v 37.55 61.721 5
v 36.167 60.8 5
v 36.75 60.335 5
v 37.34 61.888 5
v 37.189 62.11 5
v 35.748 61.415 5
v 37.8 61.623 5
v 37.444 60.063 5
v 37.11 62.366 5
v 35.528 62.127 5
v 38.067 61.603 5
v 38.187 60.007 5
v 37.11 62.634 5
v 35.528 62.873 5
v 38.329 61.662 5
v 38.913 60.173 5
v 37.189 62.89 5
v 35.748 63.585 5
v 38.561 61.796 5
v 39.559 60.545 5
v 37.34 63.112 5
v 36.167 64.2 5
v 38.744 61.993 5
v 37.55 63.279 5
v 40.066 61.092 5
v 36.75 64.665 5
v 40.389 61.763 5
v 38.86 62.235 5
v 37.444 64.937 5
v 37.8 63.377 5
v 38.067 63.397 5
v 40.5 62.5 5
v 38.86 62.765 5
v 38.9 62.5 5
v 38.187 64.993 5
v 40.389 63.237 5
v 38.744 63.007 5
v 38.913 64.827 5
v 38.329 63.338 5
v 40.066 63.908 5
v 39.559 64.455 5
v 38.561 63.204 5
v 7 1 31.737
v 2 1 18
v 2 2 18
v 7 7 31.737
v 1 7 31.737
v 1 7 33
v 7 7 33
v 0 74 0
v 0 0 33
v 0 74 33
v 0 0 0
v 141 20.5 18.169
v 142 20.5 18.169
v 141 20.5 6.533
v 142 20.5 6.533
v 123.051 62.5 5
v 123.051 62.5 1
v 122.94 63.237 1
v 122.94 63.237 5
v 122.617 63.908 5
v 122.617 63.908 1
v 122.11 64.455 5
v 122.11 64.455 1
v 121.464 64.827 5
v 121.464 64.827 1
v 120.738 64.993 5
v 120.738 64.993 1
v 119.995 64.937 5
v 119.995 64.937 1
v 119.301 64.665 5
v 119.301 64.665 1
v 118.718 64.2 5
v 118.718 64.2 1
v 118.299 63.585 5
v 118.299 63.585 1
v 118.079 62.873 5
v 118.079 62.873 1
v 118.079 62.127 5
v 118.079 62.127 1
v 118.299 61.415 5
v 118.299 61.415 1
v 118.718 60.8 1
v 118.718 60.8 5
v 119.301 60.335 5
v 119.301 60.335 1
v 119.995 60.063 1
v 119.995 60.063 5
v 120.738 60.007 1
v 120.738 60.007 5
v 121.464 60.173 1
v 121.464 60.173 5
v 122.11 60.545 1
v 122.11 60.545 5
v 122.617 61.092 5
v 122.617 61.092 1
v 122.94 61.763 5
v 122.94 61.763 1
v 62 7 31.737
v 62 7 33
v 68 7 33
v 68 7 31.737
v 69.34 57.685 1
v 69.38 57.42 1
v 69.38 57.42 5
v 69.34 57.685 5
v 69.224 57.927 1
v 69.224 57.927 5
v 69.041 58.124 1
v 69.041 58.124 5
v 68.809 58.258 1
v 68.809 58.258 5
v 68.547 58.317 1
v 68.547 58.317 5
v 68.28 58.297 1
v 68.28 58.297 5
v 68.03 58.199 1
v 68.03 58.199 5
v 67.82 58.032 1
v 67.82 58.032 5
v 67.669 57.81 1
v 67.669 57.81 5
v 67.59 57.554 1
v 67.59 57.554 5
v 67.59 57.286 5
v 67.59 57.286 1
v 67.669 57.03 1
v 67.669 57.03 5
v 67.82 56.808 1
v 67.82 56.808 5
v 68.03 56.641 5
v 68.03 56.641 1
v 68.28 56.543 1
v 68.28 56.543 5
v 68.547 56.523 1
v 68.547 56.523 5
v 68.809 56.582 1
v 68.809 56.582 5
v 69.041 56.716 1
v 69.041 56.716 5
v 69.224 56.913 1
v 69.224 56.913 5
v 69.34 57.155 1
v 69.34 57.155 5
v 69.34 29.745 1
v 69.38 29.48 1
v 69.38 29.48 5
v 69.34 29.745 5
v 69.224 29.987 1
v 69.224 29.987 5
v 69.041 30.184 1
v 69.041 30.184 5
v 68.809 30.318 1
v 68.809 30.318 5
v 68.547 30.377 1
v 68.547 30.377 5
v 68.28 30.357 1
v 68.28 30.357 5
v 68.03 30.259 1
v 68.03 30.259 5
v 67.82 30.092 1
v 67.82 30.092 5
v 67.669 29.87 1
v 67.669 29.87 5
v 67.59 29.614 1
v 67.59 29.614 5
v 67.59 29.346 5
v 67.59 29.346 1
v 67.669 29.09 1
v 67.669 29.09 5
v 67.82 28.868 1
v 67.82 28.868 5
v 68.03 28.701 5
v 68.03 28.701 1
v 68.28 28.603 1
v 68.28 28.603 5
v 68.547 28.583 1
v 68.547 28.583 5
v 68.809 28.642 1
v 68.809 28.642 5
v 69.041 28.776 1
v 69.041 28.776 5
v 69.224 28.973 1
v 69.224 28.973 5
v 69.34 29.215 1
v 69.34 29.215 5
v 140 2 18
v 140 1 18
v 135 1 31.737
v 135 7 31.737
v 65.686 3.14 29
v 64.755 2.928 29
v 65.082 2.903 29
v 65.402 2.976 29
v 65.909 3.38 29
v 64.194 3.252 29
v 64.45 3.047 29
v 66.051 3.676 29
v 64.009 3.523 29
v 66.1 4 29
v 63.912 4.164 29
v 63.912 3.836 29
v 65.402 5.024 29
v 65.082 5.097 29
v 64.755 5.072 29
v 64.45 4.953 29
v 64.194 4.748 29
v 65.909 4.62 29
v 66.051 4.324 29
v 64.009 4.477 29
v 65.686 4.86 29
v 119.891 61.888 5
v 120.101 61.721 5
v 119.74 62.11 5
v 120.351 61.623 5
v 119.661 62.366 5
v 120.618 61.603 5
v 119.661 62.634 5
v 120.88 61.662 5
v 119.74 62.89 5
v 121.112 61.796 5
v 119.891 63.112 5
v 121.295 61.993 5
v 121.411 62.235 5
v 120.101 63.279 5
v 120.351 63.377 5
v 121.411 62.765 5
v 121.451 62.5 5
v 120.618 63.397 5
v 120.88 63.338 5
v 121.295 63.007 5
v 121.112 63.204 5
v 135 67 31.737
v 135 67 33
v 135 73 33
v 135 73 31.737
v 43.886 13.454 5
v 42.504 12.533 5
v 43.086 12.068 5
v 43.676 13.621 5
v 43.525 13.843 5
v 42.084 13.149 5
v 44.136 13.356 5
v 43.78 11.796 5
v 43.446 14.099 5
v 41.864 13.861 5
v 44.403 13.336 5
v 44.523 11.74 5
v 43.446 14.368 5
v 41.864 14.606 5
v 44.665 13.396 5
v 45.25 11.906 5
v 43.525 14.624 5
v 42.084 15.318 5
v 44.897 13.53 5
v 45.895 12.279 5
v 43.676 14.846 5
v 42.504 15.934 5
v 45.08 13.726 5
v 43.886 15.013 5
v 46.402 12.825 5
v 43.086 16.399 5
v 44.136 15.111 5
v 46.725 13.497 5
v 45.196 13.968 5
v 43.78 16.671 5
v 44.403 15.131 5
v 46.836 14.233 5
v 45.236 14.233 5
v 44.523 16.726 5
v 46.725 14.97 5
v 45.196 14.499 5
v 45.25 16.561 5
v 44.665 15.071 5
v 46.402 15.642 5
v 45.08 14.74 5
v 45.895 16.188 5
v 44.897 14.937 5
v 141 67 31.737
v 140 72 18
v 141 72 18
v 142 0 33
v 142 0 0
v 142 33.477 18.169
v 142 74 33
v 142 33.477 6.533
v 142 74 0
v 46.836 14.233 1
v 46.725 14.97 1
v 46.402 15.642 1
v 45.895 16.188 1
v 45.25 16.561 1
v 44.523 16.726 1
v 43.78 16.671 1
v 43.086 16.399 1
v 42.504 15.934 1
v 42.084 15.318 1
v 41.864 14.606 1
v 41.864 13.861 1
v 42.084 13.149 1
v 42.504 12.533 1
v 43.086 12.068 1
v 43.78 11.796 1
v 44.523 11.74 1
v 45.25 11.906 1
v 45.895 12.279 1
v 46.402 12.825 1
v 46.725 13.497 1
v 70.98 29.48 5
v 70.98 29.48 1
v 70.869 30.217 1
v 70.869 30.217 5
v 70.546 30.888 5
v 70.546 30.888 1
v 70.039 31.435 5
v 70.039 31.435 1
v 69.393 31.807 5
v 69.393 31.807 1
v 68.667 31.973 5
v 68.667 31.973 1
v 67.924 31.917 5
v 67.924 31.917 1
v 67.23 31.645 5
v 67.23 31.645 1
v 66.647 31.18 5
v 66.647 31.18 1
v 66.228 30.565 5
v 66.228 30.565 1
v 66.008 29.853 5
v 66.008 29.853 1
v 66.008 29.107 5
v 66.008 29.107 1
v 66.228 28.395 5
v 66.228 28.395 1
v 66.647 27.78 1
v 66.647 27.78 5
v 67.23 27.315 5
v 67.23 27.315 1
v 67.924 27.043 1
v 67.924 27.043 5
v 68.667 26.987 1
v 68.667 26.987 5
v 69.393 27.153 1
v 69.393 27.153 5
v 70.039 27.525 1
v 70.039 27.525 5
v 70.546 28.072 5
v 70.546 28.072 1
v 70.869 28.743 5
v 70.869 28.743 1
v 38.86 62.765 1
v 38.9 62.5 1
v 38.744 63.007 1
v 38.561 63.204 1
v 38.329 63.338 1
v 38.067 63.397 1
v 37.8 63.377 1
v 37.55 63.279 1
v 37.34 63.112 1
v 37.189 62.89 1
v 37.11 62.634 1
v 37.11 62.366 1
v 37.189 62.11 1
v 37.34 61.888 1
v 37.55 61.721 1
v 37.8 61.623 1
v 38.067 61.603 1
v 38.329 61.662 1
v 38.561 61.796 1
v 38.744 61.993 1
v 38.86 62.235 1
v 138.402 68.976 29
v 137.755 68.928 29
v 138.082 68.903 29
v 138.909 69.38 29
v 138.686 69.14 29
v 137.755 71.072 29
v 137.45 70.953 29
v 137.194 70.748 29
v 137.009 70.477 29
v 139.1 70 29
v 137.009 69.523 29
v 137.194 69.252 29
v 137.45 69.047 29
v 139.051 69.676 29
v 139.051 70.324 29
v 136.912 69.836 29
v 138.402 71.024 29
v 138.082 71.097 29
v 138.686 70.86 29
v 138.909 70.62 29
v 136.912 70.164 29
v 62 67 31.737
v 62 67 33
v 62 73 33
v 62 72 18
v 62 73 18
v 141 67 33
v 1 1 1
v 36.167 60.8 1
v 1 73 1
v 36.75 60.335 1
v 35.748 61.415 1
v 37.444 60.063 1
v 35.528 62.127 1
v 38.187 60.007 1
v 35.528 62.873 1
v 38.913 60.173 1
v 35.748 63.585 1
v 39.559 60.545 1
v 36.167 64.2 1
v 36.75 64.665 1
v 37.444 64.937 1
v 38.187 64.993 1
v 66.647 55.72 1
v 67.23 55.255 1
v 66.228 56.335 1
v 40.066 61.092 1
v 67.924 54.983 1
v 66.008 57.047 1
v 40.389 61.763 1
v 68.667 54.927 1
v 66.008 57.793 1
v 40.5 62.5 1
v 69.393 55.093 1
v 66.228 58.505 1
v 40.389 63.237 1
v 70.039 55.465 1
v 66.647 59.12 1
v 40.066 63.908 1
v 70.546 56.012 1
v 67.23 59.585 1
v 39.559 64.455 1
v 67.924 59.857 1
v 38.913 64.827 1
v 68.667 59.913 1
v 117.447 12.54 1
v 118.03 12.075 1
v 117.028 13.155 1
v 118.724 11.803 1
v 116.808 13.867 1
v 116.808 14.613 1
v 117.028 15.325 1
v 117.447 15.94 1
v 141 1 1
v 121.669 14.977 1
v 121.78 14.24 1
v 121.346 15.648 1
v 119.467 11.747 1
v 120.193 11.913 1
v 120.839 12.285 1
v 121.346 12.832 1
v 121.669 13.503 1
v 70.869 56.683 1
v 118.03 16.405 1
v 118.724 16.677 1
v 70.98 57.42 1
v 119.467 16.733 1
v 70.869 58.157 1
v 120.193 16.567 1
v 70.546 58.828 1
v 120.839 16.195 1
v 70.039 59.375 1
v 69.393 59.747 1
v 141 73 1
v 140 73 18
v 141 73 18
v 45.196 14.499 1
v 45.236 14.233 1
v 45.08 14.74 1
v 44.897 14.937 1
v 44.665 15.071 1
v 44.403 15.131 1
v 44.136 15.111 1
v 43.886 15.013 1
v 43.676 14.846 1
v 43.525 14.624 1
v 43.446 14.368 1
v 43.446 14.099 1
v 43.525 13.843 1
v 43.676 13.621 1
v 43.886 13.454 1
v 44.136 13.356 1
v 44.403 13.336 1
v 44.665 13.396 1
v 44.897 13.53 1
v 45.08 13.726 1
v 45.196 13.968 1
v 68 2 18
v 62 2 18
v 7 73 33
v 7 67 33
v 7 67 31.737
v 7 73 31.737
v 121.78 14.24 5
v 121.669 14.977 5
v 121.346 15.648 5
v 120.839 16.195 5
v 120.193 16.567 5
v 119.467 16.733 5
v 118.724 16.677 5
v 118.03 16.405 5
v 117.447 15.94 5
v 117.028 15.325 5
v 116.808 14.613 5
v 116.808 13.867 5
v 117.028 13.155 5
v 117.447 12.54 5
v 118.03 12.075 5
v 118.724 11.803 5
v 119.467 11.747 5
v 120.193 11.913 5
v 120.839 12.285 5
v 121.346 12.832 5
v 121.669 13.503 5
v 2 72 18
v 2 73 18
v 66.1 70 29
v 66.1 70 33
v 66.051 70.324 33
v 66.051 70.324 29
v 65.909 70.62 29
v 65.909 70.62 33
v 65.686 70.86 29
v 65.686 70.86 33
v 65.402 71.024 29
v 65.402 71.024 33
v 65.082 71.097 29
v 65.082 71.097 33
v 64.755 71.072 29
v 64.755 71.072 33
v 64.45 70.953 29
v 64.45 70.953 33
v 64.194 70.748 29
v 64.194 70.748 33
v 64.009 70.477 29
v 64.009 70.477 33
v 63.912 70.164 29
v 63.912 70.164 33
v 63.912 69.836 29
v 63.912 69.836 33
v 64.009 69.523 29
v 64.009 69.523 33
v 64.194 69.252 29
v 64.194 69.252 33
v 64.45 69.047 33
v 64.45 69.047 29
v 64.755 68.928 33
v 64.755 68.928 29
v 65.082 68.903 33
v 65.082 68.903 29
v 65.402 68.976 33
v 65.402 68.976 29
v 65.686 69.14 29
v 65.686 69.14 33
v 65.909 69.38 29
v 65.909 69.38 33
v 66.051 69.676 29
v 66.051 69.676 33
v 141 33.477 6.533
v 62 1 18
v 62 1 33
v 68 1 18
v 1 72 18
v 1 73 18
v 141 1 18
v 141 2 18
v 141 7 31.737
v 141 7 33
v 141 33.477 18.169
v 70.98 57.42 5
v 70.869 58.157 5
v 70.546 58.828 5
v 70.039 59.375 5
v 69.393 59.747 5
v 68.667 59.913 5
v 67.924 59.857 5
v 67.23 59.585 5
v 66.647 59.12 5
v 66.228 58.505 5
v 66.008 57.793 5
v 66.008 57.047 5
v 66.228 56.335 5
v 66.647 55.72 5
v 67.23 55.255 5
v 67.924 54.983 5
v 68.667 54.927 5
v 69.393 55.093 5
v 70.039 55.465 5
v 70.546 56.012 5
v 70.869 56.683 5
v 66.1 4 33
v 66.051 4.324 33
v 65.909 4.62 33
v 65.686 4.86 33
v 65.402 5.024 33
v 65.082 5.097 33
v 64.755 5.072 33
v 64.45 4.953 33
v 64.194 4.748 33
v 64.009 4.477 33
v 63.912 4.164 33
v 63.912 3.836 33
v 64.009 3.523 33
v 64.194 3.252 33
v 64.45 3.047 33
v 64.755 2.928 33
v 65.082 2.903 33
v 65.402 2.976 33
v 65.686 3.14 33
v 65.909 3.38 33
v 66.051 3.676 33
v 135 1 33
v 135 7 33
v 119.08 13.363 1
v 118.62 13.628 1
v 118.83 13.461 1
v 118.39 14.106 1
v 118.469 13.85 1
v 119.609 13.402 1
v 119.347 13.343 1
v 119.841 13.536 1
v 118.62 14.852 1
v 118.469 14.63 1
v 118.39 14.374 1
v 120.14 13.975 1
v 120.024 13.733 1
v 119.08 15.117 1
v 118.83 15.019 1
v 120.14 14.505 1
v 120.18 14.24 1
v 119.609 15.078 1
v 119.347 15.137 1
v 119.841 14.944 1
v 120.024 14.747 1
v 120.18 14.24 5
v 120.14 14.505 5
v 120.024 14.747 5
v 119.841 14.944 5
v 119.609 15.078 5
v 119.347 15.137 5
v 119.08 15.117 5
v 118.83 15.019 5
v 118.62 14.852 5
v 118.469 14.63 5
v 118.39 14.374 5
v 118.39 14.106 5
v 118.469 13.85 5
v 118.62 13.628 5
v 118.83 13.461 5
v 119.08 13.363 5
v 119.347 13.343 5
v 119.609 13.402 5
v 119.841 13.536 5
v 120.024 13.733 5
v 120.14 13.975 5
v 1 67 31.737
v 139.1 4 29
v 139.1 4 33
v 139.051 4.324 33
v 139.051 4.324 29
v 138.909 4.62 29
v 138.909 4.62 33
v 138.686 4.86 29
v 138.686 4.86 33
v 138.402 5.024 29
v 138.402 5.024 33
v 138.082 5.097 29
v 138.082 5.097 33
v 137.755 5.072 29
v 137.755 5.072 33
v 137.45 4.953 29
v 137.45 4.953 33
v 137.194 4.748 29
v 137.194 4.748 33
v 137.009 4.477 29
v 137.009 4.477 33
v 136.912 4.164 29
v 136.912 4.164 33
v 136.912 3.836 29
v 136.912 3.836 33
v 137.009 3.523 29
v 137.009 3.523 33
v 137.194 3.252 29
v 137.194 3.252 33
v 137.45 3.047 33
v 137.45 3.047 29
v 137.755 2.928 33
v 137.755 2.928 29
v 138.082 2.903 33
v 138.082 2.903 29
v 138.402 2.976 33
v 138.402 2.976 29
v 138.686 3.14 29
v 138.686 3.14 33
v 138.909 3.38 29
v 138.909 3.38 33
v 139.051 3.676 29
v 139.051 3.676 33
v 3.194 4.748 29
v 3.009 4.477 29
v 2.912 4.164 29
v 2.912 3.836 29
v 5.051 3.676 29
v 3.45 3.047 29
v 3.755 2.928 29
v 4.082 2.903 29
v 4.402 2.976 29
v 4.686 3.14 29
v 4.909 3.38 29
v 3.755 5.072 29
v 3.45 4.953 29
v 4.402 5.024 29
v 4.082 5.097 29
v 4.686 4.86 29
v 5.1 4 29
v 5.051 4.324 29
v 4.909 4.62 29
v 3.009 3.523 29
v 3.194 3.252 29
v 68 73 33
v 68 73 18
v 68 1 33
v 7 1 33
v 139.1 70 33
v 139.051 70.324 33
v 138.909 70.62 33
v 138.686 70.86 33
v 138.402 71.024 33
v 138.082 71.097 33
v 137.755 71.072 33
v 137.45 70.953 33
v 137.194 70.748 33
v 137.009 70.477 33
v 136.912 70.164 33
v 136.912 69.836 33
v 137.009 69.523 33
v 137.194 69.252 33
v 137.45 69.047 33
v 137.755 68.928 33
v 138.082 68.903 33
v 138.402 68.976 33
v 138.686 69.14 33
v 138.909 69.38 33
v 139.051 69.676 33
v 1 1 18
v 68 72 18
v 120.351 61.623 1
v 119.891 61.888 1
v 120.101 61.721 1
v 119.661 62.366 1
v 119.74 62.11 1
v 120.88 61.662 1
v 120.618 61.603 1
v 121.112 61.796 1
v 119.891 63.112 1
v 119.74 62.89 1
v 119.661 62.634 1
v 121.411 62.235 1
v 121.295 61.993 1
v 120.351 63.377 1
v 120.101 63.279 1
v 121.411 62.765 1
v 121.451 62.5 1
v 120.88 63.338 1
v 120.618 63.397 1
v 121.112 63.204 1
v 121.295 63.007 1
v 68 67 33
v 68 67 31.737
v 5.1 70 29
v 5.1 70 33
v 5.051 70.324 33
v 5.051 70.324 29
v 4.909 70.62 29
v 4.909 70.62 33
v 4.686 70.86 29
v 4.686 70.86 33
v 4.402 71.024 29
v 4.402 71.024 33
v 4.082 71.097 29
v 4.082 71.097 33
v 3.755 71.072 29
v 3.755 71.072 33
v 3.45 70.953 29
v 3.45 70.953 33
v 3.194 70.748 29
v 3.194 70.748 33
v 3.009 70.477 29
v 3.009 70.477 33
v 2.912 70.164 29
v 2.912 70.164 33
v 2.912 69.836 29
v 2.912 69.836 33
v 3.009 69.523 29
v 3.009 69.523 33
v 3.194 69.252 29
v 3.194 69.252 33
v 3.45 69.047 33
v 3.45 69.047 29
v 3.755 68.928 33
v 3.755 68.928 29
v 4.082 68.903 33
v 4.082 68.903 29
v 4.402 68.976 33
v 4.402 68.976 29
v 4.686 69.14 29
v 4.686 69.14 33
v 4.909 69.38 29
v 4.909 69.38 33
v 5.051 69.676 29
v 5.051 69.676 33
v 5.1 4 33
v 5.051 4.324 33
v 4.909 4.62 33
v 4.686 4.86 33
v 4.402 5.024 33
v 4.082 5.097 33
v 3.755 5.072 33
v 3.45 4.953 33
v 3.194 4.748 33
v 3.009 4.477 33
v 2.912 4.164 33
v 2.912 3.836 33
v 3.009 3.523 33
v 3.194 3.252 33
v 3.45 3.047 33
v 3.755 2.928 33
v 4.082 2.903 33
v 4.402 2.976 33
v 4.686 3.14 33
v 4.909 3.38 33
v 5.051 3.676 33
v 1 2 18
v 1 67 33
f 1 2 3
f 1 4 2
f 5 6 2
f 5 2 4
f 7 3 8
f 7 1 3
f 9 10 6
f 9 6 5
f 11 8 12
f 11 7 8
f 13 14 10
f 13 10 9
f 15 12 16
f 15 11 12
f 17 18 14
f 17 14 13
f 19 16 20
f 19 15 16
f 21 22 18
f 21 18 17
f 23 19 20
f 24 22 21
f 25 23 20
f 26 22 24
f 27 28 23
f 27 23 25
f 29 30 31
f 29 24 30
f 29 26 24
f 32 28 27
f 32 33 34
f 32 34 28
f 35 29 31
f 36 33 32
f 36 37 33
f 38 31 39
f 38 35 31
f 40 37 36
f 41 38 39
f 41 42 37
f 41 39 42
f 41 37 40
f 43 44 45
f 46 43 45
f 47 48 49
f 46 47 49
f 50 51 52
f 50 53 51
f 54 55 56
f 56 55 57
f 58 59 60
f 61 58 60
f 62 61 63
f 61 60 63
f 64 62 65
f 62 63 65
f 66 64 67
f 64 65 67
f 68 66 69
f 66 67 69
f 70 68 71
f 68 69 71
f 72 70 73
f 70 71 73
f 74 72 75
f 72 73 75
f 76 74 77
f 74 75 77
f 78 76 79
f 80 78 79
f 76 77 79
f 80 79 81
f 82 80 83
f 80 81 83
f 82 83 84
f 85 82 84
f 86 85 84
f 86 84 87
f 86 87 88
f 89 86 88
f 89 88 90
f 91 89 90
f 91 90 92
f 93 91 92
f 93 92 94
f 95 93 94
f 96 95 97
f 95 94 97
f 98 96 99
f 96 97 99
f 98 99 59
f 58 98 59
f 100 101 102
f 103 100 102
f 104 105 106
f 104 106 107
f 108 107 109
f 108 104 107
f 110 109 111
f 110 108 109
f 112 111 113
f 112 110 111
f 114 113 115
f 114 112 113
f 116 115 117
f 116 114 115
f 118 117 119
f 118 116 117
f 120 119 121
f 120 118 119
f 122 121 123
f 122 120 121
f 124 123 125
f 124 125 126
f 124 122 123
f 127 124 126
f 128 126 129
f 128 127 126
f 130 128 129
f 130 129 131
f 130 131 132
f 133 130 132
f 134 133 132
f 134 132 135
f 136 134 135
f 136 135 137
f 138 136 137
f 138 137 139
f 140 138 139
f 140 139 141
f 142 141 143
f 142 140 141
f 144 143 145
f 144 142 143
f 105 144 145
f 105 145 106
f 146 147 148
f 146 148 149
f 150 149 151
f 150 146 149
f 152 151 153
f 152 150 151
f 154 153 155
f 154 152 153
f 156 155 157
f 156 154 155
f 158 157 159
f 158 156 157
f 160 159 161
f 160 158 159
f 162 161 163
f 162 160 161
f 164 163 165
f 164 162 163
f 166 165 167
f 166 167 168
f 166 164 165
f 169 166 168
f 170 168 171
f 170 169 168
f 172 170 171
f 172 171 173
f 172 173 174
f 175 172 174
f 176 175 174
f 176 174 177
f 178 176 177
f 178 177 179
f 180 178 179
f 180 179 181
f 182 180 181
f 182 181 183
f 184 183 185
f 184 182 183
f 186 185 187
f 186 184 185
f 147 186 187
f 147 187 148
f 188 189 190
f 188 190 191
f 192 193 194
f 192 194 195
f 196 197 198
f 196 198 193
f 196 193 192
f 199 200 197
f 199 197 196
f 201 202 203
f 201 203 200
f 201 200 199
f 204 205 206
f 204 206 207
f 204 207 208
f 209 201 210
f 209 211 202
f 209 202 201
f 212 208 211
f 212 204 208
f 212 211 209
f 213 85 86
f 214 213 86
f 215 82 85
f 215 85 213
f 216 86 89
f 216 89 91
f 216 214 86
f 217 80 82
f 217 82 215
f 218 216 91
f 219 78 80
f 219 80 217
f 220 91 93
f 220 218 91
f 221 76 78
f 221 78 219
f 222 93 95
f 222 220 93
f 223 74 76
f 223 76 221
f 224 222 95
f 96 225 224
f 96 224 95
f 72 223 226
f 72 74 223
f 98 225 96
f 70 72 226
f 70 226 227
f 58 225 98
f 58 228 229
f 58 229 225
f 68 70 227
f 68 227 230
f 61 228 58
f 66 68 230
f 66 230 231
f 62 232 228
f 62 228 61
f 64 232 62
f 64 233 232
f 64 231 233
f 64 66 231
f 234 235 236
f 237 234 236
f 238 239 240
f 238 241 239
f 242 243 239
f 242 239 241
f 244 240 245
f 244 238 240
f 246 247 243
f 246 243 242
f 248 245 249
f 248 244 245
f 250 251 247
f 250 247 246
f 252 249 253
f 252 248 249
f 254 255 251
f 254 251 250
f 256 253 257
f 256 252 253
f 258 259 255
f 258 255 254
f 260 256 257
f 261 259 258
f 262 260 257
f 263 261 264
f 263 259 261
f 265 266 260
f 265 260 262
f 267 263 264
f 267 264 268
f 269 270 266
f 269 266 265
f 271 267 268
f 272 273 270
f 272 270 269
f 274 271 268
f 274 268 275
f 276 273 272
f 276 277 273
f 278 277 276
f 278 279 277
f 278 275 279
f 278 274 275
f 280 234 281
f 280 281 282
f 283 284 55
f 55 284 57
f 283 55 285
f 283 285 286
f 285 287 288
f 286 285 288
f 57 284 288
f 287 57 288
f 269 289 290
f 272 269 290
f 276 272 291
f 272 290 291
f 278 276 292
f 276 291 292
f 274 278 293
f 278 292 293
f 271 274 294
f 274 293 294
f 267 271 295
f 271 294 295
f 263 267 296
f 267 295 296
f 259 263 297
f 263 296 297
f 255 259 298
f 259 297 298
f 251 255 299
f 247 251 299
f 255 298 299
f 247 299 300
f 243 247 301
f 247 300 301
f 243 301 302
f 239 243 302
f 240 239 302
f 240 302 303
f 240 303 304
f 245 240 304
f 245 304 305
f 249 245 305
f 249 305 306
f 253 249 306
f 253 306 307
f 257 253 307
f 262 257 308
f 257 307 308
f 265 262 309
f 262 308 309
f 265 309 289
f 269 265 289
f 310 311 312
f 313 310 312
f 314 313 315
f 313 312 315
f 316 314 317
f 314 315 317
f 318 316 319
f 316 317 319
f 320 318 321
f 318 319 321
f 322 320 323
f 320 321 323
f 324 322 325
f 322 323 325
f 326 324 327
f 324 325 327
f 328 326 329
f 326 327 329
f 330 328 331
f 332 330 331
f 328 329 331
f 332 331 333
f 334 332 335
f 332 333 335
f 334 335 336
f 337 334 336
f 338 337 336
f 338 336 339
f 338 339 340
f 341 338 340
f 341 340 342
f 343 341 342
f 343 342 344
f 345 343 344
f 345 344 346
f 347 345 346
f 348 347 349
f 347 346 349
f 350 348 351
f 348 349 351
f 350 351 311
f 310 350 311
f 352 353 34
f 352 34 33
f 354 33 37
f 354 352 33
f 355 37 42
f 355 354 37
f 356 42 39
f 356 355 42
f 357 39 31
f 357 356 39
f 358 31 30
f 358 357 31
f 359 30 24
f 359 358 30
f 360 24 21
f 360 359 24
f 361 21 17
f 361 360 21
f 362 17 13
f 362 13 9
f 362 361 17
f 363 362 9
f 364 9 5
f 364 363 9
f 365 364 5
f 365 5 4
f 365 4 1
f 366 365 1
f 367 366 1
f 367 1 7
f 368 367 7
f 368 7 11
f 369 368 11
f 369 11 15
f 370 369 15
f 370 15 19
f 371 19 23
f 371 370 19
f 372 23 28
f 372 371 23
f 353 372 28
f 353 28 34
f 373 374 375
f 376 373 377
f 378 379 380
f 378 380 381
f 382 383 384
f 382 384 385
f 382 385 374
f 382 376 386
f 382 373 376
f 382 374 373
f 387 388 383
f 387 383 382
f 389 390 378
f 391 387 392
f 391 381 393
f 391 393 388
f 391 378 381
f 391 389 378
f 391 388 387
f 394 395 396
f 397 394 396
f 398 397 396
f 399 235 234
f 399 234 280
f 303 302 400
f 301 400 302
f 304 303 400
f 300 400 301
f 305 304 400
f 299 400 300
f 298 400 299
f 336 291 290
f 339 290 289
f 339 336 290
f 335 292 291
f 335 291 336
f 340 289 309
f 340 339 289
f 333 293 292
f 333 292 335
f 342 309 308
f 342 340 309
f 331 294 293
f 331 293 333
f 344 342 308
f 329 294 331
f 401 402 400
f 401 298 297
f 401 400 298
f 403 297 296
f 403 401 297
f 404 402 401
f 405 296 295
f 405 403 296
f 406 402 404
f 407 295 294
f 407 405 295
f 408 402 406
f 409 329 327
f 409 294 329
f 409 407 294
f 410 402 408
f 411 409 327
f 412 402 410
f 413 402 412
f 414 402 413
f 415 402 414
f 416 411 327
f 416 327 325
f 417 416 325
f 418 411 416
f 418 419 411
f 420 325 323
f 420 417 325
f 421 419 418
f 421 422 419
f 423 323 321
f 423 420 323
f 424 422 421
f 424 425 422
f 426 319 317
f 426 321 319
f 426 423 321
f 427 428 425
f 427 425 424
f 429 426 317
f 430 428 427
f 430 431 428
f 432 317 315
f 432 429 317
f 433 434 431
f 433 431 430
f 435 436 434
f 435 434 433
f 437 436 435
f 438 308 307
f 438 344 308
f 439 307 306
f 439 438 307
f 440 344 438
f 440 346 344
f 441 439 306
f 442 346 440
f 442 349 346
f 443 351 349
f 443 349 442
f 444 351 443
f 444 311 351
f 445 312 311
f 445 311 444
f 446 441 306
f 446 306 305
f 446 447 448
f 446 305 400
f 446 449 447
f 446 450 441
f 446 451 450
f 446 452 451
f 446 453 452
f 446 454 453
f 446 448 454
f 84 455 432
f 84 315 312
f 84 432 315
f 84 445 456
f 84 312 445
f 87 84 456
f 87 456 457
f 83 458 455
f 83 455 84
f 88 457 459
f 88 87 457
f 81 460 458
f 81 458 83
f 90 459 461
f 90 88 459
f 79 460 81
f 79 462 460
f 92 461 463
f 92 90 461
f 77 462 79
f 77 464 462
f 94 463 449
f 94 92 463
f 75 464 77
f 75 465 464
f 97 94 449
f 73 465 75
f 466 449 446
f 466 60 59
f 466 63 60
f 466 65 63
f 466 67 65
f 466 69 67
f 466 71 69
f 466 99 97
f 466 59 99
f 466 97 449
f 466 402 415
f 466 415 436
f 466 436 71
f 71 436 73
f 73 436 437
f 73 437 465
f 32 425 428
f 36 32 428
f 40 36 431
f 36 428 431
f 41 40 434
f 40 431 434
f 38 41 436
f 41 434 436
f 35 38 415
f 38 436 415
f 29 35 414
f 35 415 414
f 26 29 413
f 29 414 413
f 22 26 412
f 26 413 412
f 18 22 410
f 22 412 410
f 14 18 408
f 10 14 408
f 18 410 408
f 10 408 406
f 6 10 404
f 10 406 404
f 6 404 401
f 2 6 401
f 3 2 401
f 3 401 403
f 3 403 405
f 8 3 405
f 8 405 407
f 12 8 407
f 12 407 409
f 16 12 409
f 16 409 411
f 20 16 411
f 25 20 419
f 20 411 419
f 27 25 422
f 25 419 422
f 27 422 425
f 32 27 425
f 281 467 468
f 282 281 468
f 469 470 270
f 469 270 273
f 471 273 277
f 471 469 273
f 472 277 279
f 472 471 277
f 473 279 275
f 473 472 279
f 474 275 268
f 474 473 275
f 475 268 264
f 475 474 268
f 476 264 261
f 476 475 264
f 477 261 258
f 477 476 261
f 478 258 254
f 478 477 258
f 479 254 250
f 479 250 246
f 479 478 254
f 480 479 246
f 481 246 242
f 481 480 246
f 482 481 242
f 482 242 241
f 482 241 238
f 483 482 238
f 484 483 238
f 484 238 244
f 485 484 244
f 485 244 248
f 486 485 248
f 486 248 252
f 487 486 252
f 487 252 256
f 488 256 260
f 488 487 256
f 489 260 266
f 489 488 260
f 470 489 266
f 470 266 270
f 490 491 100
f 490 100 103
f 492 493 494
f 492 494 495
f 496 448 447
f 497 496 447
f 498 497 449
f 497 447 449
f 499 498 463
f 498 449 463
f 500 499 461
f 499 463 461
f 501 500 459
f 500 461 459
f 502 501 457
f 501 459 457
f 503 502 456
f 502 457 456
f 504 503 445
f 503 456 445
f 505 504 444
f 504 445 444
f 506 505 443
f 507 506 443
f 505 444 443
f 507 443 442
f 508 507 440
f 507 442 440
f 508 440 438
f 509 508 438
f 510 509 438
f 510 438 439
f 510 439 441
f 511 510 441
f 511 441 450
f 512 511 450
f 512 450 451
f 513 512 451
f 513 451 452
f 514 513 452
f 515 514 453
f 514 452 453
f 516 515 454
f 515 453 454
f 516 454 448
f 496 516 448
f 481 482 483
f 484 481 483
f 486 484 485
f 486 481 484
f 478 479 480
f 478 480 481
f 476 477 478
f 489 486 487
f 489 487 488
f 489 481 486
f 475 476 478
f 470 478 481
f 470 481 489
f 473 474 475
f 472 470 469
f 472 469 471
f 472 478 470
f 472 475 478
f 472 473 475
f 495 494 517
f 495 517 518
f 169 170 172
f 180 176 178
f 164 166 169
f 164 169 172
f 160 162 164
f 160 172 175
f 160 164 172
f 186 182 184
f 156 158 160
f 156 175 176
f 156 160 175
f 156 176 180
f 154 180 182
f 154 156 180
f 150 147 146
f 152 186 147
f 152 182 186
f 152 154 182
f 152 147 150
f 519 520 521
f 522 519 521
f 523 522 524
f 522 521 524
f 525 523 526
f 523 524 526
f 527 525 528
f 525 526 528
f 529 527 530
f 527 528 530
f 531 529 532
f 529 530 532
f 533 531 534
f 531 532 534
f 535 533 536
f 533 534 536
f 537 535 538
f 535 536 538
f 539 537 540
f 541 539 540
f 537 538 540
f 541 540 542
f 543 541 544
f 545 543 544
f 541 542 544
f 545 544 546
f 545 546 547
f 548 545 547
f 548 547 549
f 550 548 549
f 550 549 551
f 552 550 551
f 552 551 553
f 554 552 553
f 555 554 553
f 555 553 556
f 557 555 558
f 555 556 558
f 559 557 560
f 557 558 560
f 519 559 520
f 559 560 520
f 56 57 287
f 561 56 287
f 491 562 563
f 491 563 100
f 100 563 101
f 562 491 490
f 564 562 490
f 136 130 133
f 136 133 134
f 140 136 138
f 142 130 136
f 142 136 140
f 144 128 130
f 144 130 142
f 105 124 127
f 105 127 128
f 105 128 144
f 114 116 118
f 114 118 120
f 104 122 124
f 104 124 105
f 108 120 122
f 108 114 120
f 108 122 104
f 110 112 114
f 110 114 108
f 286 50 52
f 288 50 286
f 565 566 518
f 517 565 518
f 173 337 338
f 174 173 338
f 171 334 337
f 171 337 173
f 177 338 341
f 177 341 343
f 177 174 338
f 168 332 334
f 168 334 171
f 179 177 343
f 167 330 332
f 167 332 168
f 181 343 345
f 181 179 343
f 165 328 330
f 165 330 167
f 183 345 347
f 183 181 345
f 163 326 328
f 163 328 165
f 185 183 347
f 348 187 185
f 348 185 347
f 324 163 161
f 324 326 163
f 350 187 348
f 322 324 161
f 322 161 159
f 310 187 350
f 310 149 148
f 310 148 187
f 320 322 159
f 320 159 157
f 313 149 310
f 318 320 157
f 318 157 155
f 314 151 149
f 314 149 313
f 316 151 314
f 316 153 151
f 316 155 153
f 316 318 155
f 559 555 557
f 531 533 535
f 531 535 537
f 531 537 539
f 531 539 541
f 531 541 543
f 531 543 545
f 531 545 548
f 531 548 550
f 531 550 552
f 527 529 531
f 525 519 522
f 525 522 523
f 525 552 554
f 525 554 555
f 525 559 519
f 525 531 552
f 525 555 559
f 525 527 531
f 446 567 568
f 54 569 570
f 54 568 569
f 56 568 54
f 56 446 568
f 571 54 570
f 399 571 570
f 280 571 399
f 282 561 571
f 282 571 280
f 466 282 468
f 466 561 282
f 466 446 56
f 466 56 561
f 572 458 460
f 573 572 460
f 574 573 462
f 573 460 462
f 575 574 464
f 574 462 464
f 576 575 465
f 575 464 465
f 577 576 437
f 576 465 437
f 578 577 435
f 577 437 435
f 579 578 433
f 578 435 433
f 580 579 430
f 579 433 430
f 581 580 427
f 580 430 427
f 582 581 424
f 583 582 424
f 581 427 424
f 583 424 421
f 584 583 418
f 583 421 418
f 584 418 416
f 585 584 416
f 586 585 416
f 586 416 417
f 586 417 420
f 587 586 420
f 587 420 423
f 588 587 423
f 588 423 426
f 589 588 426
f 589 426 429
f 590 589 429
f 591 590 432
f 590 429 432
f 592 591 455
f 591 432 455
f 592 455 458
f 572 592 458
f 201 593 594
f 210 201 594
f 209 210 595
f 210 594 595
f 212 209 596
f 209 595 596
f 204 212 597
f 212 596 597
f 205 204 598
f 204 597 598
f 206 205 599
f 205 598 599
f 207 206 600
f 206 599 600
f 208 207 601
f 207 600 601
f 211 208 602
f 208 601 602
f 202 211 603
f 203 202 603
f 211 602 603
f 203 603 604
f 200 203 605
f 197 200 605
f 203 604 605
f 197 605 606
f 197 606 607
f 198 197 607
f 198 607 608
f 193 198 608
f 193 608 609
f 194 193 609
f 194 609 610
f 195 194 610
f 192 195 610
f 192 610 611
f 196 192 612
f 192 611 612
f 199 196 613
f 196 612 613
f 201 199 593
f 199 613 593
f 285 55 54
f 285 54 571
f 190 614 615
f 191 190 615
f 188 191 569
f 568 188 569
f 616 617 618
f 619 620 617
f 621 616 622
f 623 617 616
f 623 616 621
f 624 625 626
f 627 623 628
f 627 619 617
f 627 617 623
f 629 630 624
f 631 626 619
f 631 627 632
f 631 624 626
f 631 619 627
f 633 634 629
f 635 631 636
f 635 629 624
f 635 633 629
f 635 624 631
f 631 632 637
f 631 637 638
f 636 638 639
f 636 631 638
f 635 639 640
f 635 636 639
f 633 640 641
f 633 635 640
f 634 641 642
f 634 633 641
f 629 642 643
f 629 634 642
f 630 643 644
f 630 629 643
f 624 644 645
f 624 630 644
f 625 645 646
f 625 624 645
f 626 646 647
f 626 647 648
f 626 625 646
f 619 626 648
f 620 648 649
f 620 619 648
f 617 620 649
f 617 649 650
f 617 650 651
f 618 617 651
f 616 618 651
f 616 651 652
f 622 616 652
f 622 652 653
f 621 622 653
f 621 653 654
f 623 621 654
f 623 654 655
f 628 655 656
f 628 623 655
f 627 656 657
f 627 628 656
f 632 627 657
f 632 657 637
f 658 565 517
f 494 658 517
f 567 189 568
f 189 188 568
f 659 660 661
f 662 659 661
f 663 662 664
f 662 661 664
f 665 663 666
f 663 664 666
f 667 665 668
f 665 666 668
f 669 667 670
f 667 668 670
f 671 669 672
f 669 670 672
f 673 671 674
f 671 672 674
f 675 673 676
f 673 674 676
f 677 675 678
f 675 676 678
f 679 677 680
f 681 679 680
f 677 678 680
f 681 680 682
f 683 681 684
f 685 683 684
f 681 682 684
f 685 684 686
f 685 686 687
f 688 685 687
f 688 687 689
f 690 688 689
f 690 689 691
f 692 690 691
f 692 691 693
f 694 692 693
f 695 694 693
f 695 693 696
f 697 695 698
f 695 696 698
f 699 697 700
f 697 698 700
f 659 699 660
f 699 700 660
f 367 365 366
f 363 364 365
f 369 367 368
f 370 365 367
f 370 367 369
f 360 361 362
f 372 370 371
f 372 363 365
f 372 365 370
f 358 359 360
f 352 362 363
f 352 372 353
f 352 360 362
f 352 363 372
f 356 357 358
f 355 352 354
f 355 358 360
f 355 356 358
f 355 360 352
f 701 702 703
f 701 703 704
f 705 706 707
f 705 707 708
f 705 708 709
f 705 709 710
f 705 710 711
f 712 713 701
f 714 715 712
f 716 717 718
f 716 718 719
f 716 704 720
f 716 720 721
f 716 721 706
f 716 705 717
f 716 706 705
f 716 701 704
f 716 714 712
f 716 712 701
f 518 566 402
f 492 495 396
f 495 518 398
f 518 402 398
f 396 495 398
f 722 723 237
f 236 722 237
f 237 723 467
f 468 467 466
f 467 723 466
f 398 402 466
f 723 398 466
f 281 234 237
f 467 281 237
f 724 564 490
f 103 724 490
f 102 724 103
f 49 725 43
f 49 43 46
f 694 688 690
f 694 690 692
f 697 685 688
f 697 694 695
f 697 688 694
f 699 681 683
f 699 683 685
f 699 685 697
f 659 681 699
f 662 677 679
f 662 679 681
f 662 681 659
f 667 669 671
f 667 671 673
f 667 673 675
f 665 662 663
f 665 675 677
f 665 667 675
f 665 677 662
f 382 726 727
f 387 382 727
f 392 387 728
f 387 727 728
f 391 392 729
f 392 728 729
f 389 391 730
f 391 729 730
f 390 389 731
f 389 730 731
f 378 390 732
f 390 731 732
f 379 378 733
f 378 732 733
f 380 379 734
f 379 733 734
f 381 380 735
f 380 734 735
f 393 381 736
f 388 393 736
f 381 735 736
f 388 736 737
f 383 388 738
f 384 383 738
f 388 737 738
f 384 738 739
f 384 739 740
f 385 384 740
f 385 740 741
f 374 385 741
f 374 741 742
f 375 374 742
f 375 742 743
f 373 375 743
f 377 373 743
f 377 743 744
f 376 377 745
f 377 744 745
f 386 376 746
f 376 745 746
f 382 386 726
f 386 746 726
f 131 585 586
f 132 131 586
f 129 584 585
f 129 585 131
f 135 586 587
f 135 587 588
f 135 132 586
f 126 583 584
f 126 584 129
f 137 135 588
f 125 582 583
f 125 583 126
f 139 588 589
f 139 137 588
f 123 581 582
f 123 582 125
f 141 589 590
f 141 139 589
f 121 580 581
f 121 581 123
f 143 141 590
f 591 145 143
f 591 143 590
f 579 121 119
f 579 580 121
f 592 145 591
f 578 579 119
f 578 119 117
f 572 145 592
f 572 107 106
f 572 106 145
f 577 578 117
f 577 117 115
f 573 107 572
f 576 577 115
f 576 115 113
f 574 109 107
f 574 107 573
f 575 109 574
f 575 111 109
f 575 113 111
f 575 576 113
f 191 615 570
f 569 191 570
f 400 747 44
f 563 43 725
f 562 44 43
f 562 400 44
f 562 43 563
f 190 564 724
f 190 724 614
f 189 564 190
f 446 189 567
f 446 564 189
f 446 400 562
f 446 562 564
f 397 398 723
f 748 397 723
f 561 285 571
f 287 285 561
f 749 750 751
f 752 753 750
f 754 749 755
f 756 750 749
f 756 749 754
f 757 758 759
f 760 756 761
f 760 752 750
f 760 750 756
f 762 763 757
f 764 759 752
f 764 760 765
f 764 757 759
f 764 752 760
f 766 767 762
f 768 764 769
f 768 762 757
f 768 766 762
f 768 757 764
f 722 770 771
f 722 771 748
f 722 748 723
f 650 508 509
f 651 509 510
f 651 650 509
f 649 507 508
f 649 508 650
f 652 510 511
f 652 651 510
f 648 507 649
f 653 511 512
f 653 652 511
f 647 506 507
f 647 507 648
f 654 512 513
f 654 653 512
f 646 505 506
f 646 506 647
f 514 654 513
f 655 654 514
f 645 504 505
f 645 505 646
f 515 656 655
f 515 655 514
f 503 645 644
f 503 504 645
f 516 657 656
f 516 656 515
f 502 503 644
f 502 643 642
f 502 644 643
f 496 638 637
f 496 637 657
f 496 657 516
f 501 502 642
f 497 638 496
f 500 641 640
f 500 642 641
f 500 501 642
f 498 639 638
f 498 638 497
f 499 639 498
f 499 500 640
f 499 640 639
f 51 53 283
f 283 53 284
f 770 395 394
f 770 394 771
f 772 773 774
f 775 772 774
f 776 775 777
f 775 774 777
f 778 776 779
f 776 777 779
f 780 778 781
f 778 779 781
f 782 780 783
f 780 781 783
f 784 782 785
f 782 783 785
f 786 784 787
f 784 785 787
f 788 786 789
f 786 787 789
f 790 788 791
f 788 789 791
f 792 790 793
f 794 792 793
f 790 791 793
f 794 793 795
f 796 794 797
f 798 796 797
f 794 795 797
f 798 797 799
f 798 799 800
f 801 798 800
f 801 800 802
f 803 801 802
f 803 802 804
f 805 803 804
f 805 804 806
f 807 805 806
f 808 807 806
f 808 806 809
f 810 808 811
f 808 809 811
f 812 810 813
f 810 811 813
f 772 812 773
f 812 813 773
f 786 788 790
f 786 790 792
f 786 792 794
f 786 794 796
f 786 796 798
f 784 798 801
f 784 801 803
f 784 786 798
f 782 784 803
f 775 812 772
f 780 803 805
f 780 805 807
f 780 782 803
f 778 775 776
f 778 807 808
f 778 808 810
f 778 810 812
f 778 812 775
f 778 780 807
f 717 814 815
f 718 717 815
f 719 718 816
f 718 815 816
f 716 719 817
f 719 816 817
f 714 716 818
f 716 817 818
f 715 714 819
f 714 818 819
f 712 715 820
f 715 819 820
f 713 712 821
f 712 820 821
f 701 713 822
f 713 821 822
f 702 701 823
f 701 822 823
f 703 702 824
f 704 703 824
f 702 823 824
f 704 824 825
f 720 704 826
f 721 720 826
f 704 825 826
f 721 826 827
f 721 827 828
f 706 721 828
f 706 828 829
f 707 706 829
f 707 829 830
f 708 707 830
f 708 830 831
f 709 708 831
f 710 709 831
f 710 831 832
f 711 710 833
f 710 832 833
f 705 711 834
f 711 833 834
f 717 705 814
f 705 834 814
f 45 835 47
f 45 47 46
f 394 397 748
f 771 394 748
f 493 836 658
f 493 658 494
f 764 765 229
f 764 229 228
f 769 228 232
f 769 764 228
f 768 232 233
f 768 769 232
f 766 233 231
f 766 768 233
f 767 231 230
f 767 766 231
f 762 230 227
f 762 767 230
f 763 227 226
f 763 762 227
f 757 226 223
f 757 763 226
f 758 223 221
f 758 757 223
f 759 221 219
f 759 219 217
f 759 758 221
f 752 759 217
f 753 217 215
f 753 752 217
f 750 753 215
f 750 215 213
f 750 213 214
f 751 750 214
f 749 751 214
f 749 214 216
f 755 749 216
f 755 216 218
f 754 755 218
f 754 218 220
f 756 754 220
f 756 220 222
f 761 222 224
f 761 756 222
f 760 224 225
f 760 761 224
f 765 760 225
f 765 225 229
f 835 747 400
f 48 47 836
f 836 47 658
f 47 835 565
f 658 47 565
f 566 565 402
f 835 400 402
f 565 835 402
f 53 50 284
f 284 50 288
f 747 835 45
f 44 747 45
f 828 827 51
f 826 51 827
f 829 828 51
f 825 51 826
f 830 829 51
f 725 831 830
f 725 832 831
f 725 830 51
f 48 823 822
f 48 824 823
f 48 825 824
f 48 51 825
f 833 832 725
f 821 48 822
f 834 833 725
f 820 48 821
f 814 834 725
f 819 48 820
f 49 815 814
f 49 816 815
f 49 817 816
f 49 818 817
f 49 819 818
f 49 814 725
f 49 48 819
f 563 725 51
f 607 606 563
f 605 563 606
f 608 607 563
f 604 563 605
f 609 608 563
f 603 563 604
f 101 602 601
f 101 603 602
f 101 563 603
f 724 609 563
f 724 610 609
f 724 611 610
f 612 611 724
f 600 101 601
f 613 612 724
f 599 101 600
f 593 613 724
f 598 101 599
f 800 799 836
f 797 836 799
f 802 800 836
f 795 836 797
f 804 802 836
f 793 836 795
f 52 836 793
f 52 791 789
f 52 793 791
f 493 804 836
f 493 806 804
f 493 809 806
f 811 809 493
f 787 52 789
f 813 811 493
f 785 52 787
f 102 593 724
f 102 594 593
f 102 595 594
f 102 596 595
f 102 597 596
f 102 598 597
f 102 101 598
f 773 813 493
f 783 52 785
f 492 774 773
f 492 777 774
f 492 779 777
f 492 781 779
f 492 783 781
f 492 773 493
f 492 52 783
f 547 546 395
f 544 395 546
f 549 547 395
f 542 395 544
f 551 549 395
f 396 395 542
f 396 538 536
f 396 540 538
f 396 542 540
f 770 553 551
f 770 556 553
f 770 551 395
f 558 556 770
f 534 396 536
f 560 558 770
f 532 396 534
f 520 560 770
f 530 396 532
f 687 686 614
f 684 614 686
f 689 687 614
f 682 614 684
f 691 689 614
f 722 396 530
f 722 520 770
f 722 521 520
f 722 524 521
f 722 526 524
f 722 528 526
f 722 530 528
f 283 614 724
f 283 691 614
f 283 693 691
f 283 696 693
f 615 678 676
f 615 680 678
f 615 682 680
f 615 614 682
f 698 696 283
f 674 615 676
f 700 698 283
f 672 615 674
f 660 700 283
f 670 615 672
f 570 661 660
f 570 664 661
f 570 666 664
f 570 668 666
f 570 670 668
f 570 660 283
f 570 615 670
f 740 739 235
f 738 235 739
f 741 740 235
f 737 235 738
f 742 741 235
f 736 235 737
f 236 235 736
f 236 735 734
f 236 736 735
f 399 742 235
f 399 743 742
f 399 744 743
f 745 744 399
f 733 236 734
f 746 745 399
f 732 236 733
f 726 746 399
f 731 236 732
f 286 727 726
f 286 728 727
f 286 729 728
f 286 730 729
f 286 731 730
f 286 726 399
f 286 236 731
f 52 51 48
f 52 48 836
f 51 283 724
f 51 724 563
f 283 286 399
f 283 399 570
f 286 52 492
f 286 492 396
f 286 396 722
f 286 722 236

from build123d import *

# Parameters (mm, degrees)
ESQUISSE1_W             = 142
ESQUISSE1_H             = 74
BOSS_EXTRU_1_DEPTH      = 1
ESQUISSE2_W             = 142
ESQUISSE2_H             = 74
ESQUISSE2_W_2           = 140
ESQUISSE2_H_2           = 72
BOSS_EXTRU_2_DEPTH      = 32
ESQUISSE3_W             = 6
ESQUISSE3_H             = 6
BOSS_EXTRU_3_DEPTH      = 15
CHANFREIN1_SIZE         = 5
CHANFREIN1_SIZE2        = 13.737387097
CHANFREIN1_PART_2_SIZE  = 5
CHANFREIN1_PART_2_SIZE2 = 13.737387097
CHANFREIN1_PART_3_SIZE  = 5
CHANFREIN1_PART_3_SIZE2 = 13.737387097
CHANFREIN1_PART_4_SIZE  = 5
CHANFREIN1_PART_4_SIZE2 = 13.737387097
CHANFREIN1_PART_5_SIZE  = 5
CHANFREIN1_PART_5_SIZE2 = 13.737387097
CHANFREIN1_PART_6_SIZE  = 5
CHANFREIN1_PART_6_SIZE2 = 13.737387097
ESQUISSE4_R             = 1.1
ENL_V_MAT_EXTRU_1_DEPTH = 4
ESQUISSE5_R             = 2.5
ESQUISSE5_R_2           = 0.9
BOSS_EXTRU_4_DEPTH      = 4
ESQUISSE6_W             = 11.635872756
ESQUISSE6_H             = 12.977079273
ENL_V_MAT_EXTRU_2_DEPTH = 3


with BuildPart() as part:
    # Esquisse1 → Boss.-Extru.1 (new body)
    with BuildSketch(Plane.XY):
        with Locations((71, 37)):
            Rectangle(ESQUISSE1_W, ESQUISSE1_H)
    extrude(amount=BOSS_EXTRU_1_DEPTH)

    # Esquisse2 → Boss.-Extru.2 (add)
    with BuildSketch(Plane.XY.offset(1)):
        with Locations((71, 37)):
            Rectangle(ESQUISSE2_W, ESQUISSE2_H)
        with Locations((71, 37)):
            Rectangle(ESQUISSE2_W_2, ESQUISSE2_H_2, mode=Mode.SUBTRACT)
    extrude(amount=BOSS_EXTRU_2_DEPTH)

    # Esquisse3 → Boss.-Extru.3 (add)
    with BuildSketch(Plane.XY.offset(33)):
        with Locations((4, 70)):
            Rectangle(ESQUISSE3_W, ESQUISSE3_H)
        with Locations((138, 70)):
            Rectangle(ESQUISSE3_W, ESQUISSE3_H)
        with Locations((138, 4)):
            Rectangle(ESQUISSE3_W, ESQUISSE3_H)
        with Locations((4, 4)):
            Rectangle(ESQUISSE3_W, ESQUISSE3_H)
        with Locations((65, 4)):
            Rectangle(ESQUISSE3_W, ESQUISSE3_H)
        with Locations((65, 70)):
            Rectangle(ESQUISSE3_W, ESQUISSE3_H)
    extrude(amount=-BOSS_EXTRU_3_DEPTH)

    # Chanfrein1
    chanfrein1_edges = [part.edges().sort_by_distance(p)[0] for p in [
        (7, 70, 18),
        (4, 67, 18),
    ]]
    chanfrein1_side = [part.faces().sort_by_distance(p)[0] for p in [
        (4, 70, 18),
    ]]
    chamfer(chanfrein1_edges, length=CHANFREIN1_SIZE, length2=CHANFREIN1_SIZE2, reference=chanfrein1_side[0])

    # Chanfrein1 part 2
    chanfrein1_part_2_edges = [part.edges().sort_by_distance(p)[0] for p in [
        (138, 67, 18),
        (135, 70, 18),
    ]]
    chanfrein1_part_2_side = [part.faces().sort_by_distance(p)[0] for p in [
        (138, 70, 18),
    ]]
    chamfer(chanfrein1_part_2_edges, length=CHANFREIN1_PART_2_SIZE, length2=CHANFREIN1_PART_2_SIZE2, reference=chanfrein1_part_2_side[0])

    # Chanfrein1 part 3
    chanfrein1_part_3_edges = [part.edges().sort_by_distance(p)[0] for p in [
        (135, 4, 18),
        (138, 7, 18),
    ]]
    chanfrein1_part_3_side = [part.faces().sort_by_distance(p)[0] for p in [
        (138, 4, 18),
    ]]
    chamfer(chanfrein1_part_3_edges, length=CHANFREIN1_PART_3_SIZE, length2=CHANFREIN1_PART_3_SIZE2, reference=chanfrein1_part_3_side[0])

    # Chanfrein1 part 4
    chanfrein1_part_4_edges = [part.edges().sort_by_distance(p)[0] for p in [
        (4, 7, 18),
        (7, 4, 18),
    ]]
    chanfrein1_part_4_side = [part.faces().sort_by_distance(p)[0] for p in [
        (4, 4, 18),
    ]]
    chamfer(chanfrein1_part_4_edges, length=CHANFREIN1_PART_4_SIZE, length2=CHANFREIN1_PART_4_SIZE2, reference=chanfrein1_part_4_side[0])

    # Chanfrein1 part 5
    chanfrein1_part_5_edges = [part.edges().sort_by_distance(p)[0] for p in [
        (65, 7, 18),
    ]]
    chanfrein1_part_5_side = [part.faces().sort_by_distance(p)[0] for p in [
        (65, 4, 18),
    ]]
    chamfer(chanfrein1_part_5_edges, length=CHANFREIN1_PART_5_SIZE, length2=CHANFREIN1_PART_5_SIZE2, reference=chanfrein1_part_5_side[0])

    # Chanfrein1 part 6
    chanfrein1_part_6_edges = [part.edges().sort_by_distance(p)[0] for p in [
        (65, 67, 18),
    ]]
    chanfrein1_part_6_side = [part.faces().sort_by_distance(p)[0] for p in [
        (65, 70, 18),
    ]]
    chamfer(chanfrein1_part_6_edges, length=CHANFREIN1_PART_6_SIZE, length2=CHANFREIN1_PART_6_SIZE2, reference=chanfrein1_part_6_side[0])

    # Esquisse4 → Enlèv. mat.-Extru.1 (cut)
    with BuildSketch(Plane.XY.offset(33)):
        with Locations((4, 70)):
            Circle(ESQUISSE4_R)
        with Locations((65, 70)):
            Circle(ESQUISSE4_R)
        with Locations((138, 70)):
            Circle(ESQUISSE4_R)
        with Locations((138, 4)):
            Circle(ESQUISSE4_R)
        with Locations((65, 4)):
            Circle(ESQUISSE4_R)
        with Locations((4, 4)):
            Circle(ESQUISSE4_R)
    extrude(amount=-ENL_V_MAT_EXTRU_1_DEPTH, mode=Mode.SUBTRACT)

    # Esquisse5 → Boss.-Extru.4 (add)
    with BuildSketch(Plane.XY.offset(1)):
        with Locations((38, 62.5)):
            Circle(ESQUISSE5_R)
        with Locations((38, 62.5)):
            Circle(ESQUISSE5_R_2, mode=Mode.SUBTRACT)
        with Locations((68.48, 57.42)):
            Circle(ESQUISSE5_R)
        with Locations((68.48, 57.42)):
            Circle(ESQUISSE5_R_2, mode=Mode.SUBTRACT)
        with Locations((68.48, 29.48)):
            Circle(ESQUISSE5_R)
        with Locations((68.48, 29.48)):
            Circle(ESQUISSE5_R_2, mode=Mode.SUBTRACT)
        with Locations((44.336188826, 14.23343905)):
            Circle(ESQUISSE5_R)
        with Locations((44.336188826, 14.23343905)):
            Circle(ESQUISSE5_R_2, mode=Mode.SUBTRACT)
        with Locations((120.550955535, 62.5)):
            Circle(ESQUISSE5_R)
        with Locations((120.550955535, 62.5)):
            Circle(ESQUISSE5_R_2, mode=Mode.SUBTRACT)
        with Locations((119.28, 14.24)):
            Circle(ESQUISSE5_R)
        with Locations((119.28, 14.24)):
            Circle(ESQUISSE5_R_2, mode=Mode.SUBTRACT)
    extrude(amount=BOSS_EXTRU_4_DEPTH)

    # Esquisse6 → Enlèv. mat.-Extru.2 (cut)
    with BuildSketch(Plane(origin=(142, 0, 0), x_dir=(0, 0, -1), z_dir=(1, 0, 0))):
        with Locations((-12.35060992, 26.988539637)):
            Rectangle(ESQUISSE6_W, ESQUISSE6_H)
    extrude(amount=-ENL_V_MAT_EXTRU_2_DEPTH, mode=Mode.SUBTRACT)


solid = part.part
